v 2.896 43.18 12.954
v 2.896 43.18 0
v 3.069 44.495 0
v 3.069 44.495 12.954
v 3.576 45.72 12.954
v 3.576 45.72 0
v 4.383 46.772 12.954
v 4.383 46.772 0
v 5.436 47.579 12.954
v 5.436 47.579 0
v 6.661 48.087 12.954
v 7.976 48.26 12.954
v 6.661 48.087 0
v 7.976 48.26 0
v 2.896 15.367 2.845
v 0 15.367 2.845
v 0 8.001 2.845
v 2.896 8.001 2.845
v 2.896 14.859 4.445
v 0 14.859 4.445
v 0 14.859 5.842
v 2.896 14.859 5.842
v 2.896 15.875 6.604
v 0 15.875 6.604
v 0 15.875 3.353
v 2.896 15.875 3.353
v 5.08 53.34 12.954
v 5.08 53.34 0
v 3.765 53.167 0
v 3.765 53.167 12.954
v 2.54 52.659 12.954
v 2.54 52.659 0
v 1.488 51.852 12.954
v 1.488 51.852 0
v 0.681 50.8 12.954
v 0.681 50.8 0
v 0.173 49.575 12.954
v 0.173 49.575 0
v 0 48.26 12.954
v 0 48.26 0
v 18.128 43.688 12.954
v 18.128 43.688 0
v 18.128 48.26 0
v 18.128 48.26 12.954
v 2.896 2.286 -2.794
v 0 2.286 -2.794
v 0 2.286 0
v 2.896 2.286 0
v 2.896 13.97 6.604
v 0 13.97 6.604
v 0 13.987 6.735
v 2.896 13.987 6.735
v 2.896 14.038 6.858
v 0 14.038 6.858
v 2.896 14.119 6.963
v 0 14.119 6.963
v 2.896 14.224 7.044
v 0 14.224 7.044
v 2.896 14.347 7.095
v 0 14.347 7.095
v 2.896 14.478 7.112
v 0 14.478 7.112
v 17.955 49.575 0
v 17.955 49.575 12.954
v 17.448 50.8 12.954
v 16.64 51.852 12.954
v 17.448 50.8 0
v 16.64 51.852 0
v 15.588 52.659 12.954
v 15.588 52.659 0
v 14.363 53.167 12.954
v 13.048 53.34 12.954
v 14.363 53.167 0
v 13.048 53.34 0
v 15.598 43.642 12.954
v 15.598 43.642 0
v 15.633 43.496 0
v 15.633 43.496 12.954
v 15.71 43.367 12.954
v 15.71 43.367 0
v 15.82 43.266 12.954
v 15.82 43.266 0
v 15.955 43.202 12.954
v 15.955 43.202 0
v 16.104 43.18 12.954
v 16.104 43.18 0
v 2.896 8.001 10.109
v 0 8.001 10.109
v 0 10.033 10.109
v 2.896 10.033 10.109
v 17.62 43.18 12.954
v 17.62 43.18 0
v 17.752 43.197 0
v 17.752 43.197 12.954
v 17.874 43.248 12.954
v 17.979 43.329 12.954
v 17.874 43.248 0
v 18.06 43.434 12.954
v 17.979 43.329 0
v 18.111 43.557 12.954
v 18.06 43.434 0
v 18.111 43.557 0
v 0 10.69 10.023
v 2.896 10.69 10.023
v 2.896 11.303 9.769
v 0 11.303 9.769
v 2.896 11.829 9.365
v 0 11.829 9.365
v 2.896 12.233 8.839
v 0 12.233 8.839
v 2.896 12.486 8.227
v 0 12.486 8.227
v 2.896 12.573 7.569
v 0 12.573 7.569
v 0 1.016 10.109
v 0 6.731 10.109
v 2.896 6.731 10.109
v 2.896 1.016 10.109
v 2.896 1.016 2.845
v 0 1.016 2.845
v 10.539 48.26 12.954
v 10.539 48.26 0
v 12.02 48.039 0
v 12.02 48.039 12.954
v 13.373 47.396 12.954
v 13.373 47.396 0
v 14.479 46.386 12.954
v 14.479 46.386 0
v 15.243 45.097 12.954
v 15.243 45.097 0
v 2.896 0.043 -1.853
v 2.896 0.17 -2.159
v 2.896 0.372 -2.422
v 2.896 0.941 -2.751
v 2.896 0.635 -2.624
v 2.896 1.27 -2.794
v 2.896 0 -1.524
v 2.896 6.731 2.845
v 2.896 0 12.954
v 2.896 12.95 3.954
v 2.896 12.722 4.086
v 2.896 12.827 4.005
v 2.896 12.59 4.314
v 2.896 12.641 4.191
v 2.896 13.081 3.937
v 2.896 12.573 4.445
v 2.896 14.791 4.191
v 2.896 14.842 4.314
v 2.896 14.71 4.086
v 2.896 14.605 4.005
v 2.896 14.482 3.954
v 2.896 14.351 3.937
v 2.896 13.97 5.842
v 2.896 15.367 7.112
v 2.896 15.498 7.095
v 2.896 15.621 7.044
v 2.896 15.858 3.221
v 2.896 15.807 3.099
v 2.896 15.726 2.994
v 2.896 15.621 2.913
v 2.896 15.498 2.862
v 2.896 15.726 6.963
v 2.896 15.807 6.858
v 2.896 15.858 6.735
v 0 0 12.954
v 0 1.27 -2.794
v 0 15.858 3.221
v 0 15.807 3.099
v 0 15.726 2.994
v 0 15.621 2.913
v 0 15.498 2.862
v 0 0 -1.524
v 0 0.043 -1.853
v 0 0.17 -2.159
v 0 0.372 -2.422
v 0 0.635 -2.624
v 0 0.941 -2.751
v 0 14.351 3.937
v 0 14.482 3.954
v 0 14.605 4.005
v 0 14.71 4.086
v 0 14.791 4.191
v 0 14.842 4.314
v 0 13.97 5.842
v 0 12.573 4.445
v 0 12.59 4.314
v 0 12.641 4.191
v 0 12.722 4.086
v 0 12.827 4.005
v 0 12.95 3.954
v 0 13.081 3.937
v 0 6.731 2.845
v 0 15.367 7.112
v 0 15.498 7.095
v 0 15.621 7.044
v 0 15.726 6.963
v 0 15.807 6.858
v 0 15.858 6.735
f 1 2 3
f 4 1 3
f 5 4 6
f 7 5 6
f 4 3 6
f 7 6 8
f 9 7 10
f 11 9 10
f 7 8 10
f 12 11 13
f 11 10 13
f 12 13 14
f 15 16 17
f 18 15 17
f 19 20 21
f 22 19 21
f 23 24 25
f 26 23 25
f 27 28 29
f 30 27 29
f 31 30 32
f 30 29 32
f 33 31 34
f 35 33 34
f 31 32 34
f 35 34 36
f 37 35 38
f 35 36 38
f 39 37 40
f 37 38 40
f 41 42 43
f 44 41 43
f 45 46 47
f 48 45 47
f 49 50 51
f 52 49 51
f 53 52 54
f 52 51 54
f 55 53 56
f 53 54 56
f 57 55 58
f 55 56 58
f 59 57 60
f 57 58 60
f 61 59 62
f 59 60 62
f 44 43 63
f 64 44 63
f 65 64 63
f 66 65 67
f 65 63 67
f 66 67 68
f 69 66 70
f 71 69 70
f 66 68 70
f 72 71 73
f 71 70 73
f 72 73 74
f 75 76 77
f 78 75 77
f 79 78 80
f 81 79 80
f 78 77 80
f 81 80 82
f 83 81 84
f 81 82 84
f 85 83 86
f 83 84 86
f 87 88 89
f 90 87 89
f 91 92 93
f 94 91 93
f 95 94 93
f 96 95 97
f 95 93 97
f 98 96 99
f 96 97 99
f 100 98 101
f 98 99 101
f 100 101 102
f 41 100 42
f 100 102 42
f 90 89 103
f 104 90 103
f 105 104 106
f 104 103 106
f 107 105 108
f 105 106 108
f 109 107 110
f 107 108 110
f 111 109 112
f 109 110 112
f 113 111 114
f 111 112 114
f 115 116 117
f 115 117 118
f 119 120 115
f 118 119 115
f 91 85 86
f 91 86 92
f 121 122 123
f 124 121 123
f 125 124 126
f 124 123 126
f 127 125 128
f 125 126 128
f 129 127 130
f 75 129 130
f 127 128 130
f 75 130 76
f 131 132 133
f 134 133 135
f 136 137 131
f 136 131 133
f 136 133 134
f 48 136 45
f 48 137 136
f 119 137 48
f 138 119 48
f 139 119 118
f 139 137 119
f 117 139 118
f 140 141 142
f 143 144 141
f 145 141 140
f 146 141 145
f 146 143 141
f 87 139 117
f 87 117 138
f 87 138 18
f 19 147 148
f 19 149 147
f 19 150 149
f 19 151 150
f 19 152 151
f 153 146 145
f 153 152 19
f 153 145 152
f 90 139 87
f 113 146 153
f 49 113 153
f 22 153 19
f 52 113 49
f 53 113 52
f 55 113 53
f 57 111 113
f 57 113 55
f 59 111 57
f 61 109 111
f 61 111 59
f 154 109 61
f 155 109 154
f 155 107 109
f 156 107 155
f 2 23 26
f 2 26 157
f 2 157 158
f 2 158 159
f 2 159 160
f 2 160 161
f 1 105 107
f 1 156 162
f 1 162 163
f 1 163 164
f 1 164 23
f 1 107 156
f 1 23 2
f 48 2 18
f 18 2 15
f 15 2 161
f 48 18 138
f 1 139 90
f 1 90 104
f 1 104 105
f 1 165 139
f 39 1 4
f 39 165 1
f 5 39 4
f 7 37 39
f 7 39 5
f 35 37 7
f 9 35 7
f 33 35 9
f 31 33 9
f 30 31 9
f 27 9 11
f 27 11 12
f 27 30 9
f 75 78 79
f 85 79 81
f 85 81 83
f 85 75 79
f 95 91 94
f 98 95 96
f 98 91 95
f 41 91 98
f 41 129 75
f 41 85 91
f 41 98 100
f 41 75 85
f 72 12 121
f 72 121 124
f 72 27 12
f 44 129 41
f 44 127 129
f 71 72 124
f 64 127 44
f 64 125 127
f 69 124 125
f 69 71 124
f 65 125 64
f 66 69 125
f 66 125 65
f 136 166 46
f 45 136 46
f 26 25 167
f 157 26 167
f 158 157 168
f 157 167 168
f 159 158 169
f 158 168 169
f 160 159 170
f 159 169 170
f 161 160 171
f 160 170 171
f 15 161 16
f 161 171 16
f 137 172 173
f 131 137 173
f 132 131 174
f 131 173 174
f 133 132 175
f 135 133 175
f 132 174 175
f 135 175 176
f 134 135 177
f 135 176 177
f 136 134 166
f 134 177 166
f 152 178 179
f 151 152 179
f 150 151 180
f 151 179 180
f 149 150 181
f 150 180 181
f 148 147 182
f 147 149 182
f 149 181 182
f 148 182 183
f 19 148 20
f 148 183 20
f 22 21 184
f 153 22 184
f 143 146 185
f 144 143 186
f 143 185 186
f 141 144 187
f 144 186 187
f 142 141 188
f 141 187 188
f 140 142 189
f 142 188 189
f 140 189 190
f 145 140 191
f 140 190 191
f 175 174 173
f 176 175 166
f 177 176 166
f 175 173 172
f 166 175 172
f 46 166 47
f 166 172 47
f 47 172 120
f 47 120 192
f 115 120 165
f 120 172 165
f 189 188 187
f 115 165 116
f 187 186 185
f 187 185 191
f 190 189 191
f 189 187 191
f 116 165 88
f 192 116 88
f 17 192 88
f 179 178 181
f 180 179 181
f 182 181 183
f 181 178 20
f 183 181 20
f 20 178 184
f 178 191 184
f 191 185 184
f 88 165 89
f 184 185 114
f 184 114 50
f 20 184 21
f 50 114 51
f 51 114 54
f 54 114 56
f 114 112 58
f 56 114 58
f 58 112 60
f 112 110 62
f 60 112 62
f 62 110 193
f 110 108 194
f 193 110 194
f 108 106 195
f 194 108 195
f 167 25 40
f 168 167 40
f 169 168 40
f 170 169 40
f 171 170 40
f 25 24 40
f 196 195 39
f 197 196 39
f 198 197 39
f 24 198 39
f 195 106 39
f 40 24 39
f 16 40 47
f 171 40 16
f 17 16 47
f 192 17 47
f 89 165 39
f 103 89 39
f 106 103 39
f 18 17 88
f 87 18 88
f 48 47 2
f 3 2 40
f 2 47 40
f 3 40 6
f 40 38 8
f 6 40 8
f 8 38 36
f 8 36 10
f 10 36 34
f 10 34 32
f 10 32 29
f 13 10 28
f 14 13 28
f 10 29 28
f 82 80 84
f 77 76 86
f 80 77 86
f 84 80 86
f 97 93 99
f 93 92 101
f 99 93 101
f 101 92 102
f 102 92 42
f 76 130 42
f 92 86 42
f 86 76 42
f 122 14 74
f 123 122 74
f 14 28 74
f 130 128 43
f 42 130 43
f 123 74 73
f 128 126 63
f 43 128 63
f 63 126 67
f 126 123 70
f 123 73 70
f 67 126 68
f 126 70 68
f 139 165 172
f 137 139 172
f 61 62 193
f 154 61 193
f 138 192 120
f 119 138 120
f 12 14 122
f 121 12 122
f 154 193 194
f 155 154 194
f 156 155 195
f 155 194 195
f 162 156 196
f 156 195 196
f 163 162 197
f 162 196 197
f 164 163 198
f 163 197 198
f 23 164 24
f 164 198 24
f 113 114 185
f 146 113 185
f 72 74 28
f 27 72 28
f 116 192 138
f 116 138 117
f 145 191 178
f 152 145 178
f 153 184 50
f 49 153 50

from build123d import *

# Parameters (mm, degrees)
F1_DEPTH = 12.954
F2_W     = 5.715
F2_H     = 7.2644
F3_DEPTH = 18.129257
F5_DEPTH = 2.8956


with BuildPart() as f1:
    # F0 (on Top) → F1 (new body)
    with BuildSketch(Plane.XY):
        with BuildLine():
            Line((0, 48.26), (0, 0))
            Line((0, 0), (2.8956, 0))
            Line((2.8956, 0), (2.8956, 43.18))
            ThreePointArc((2.8956, 43.18), (4.383498, 46.772102), (7.9756, 48.26))
            Line((7.9756, 48.26), (10.538739, 48.26))
            ThreePointArc((10.538739, 48.26), (13.963674, 46.931829), (15.597704, 43.641818))
            ThreePointArc((15.597704, 43.641818), (15.761106, 43.312817), (16.1036, 43.18))
            Line((16.1036, 43.18), (17.620257, 43.18))
            ThreePointArc((17.620257, 43.18), (17.979467, 43.32879), (18.128257, 43.688))
            Line((18.128257, 43.688), (18.128257, 48.26))
            ThreePointArc((18.128257, 48.26), (16.64036, 51.852102), (13.048257, 53.34))
            Line((13.048257, 53.34), (5.08, 53.34))
            ThreePointArc((5.08, 53.34), (1.487898, 51.852102), (0, 48.26))
        make_face()
    extrude(amount=F1_DEPTH)

    # F2 (on face) → F3 (cut, through all)
    with BuildSketch(Plane(origin=(0, 0, 0), x_dir=(0, -1, 0), z_dir=(-1, 0, 0))):
        with BuildLine():
            ThreePointArc((-15.875, 3.3528), (-15.72621, 2.99359), (-15.367, 2.8448))
            Line((-15.367, 2.8448), (-8.001, 2.8448))
            Line((-8.001, 2.8448), (-8.001, 10.1092))
            Line((-8.001, 10.1092), (-10.033, 10.1092))
            ThreePointArc((-10.033, 10.1092), (-11.829051, 9.365251), (-12.573, 7.5692))
            Line((-12.573, 7.5692), (-12.573, 4.445))
            ThreePointArc((-12.573, 4.445), (-12.72179, 4.08579), (-13.081, 3.937))
            Line((-13.081, 3.937), (-14.351, 3.937))
            ThreePointArc((-14.351, 3.937), (-14.71021, 4.08579), (-14.859, 4.445))
            Line((-14.859, 4.445), (-14.859, 5.842))
            Line((-14.859, 5.842), (-13.97, 5.842))
            Line((-13.97, 5.842), (-13.97, 6.604))
            ThreePointArc((-13.97, 6.604), (-14.11879, 6.96321), (-14.478, 7.112))
            Line((-14.478, 7.112), (-15.367, 7.112))
            ThreePointArc((-15.367, 7.112), (-15.72621, 6.96321), (-15.875, 6.604))
            Line((-15.875, 6.604), (-15.875, 3.3528))
        make_face()
        with Locations((-3.8735, 6.477)):
            Rectangle(F2_W, F2_H)
    extrude(amount=-F3_DEPTH, mode=Mode.SUBTRACT)

    # F4 (on Right) → F5 (join, through all)
    with BuildSketch(Plane.YZ):
        with BuildLine():
            Line((2.286, 0), (0, 0))
            Line((0, 0), (0, -1.524))
            ThreePointArc((0, -1.524), (0.371974, -2.422026), (1.27, -2.794))
            Line((1.27, -2.794), (2.286, -2.794))
            Line((2.286, -2.794), (2.286, 0))
        make_face()
    extrude(amount=F5_DEPTH)


solid = f1.part
